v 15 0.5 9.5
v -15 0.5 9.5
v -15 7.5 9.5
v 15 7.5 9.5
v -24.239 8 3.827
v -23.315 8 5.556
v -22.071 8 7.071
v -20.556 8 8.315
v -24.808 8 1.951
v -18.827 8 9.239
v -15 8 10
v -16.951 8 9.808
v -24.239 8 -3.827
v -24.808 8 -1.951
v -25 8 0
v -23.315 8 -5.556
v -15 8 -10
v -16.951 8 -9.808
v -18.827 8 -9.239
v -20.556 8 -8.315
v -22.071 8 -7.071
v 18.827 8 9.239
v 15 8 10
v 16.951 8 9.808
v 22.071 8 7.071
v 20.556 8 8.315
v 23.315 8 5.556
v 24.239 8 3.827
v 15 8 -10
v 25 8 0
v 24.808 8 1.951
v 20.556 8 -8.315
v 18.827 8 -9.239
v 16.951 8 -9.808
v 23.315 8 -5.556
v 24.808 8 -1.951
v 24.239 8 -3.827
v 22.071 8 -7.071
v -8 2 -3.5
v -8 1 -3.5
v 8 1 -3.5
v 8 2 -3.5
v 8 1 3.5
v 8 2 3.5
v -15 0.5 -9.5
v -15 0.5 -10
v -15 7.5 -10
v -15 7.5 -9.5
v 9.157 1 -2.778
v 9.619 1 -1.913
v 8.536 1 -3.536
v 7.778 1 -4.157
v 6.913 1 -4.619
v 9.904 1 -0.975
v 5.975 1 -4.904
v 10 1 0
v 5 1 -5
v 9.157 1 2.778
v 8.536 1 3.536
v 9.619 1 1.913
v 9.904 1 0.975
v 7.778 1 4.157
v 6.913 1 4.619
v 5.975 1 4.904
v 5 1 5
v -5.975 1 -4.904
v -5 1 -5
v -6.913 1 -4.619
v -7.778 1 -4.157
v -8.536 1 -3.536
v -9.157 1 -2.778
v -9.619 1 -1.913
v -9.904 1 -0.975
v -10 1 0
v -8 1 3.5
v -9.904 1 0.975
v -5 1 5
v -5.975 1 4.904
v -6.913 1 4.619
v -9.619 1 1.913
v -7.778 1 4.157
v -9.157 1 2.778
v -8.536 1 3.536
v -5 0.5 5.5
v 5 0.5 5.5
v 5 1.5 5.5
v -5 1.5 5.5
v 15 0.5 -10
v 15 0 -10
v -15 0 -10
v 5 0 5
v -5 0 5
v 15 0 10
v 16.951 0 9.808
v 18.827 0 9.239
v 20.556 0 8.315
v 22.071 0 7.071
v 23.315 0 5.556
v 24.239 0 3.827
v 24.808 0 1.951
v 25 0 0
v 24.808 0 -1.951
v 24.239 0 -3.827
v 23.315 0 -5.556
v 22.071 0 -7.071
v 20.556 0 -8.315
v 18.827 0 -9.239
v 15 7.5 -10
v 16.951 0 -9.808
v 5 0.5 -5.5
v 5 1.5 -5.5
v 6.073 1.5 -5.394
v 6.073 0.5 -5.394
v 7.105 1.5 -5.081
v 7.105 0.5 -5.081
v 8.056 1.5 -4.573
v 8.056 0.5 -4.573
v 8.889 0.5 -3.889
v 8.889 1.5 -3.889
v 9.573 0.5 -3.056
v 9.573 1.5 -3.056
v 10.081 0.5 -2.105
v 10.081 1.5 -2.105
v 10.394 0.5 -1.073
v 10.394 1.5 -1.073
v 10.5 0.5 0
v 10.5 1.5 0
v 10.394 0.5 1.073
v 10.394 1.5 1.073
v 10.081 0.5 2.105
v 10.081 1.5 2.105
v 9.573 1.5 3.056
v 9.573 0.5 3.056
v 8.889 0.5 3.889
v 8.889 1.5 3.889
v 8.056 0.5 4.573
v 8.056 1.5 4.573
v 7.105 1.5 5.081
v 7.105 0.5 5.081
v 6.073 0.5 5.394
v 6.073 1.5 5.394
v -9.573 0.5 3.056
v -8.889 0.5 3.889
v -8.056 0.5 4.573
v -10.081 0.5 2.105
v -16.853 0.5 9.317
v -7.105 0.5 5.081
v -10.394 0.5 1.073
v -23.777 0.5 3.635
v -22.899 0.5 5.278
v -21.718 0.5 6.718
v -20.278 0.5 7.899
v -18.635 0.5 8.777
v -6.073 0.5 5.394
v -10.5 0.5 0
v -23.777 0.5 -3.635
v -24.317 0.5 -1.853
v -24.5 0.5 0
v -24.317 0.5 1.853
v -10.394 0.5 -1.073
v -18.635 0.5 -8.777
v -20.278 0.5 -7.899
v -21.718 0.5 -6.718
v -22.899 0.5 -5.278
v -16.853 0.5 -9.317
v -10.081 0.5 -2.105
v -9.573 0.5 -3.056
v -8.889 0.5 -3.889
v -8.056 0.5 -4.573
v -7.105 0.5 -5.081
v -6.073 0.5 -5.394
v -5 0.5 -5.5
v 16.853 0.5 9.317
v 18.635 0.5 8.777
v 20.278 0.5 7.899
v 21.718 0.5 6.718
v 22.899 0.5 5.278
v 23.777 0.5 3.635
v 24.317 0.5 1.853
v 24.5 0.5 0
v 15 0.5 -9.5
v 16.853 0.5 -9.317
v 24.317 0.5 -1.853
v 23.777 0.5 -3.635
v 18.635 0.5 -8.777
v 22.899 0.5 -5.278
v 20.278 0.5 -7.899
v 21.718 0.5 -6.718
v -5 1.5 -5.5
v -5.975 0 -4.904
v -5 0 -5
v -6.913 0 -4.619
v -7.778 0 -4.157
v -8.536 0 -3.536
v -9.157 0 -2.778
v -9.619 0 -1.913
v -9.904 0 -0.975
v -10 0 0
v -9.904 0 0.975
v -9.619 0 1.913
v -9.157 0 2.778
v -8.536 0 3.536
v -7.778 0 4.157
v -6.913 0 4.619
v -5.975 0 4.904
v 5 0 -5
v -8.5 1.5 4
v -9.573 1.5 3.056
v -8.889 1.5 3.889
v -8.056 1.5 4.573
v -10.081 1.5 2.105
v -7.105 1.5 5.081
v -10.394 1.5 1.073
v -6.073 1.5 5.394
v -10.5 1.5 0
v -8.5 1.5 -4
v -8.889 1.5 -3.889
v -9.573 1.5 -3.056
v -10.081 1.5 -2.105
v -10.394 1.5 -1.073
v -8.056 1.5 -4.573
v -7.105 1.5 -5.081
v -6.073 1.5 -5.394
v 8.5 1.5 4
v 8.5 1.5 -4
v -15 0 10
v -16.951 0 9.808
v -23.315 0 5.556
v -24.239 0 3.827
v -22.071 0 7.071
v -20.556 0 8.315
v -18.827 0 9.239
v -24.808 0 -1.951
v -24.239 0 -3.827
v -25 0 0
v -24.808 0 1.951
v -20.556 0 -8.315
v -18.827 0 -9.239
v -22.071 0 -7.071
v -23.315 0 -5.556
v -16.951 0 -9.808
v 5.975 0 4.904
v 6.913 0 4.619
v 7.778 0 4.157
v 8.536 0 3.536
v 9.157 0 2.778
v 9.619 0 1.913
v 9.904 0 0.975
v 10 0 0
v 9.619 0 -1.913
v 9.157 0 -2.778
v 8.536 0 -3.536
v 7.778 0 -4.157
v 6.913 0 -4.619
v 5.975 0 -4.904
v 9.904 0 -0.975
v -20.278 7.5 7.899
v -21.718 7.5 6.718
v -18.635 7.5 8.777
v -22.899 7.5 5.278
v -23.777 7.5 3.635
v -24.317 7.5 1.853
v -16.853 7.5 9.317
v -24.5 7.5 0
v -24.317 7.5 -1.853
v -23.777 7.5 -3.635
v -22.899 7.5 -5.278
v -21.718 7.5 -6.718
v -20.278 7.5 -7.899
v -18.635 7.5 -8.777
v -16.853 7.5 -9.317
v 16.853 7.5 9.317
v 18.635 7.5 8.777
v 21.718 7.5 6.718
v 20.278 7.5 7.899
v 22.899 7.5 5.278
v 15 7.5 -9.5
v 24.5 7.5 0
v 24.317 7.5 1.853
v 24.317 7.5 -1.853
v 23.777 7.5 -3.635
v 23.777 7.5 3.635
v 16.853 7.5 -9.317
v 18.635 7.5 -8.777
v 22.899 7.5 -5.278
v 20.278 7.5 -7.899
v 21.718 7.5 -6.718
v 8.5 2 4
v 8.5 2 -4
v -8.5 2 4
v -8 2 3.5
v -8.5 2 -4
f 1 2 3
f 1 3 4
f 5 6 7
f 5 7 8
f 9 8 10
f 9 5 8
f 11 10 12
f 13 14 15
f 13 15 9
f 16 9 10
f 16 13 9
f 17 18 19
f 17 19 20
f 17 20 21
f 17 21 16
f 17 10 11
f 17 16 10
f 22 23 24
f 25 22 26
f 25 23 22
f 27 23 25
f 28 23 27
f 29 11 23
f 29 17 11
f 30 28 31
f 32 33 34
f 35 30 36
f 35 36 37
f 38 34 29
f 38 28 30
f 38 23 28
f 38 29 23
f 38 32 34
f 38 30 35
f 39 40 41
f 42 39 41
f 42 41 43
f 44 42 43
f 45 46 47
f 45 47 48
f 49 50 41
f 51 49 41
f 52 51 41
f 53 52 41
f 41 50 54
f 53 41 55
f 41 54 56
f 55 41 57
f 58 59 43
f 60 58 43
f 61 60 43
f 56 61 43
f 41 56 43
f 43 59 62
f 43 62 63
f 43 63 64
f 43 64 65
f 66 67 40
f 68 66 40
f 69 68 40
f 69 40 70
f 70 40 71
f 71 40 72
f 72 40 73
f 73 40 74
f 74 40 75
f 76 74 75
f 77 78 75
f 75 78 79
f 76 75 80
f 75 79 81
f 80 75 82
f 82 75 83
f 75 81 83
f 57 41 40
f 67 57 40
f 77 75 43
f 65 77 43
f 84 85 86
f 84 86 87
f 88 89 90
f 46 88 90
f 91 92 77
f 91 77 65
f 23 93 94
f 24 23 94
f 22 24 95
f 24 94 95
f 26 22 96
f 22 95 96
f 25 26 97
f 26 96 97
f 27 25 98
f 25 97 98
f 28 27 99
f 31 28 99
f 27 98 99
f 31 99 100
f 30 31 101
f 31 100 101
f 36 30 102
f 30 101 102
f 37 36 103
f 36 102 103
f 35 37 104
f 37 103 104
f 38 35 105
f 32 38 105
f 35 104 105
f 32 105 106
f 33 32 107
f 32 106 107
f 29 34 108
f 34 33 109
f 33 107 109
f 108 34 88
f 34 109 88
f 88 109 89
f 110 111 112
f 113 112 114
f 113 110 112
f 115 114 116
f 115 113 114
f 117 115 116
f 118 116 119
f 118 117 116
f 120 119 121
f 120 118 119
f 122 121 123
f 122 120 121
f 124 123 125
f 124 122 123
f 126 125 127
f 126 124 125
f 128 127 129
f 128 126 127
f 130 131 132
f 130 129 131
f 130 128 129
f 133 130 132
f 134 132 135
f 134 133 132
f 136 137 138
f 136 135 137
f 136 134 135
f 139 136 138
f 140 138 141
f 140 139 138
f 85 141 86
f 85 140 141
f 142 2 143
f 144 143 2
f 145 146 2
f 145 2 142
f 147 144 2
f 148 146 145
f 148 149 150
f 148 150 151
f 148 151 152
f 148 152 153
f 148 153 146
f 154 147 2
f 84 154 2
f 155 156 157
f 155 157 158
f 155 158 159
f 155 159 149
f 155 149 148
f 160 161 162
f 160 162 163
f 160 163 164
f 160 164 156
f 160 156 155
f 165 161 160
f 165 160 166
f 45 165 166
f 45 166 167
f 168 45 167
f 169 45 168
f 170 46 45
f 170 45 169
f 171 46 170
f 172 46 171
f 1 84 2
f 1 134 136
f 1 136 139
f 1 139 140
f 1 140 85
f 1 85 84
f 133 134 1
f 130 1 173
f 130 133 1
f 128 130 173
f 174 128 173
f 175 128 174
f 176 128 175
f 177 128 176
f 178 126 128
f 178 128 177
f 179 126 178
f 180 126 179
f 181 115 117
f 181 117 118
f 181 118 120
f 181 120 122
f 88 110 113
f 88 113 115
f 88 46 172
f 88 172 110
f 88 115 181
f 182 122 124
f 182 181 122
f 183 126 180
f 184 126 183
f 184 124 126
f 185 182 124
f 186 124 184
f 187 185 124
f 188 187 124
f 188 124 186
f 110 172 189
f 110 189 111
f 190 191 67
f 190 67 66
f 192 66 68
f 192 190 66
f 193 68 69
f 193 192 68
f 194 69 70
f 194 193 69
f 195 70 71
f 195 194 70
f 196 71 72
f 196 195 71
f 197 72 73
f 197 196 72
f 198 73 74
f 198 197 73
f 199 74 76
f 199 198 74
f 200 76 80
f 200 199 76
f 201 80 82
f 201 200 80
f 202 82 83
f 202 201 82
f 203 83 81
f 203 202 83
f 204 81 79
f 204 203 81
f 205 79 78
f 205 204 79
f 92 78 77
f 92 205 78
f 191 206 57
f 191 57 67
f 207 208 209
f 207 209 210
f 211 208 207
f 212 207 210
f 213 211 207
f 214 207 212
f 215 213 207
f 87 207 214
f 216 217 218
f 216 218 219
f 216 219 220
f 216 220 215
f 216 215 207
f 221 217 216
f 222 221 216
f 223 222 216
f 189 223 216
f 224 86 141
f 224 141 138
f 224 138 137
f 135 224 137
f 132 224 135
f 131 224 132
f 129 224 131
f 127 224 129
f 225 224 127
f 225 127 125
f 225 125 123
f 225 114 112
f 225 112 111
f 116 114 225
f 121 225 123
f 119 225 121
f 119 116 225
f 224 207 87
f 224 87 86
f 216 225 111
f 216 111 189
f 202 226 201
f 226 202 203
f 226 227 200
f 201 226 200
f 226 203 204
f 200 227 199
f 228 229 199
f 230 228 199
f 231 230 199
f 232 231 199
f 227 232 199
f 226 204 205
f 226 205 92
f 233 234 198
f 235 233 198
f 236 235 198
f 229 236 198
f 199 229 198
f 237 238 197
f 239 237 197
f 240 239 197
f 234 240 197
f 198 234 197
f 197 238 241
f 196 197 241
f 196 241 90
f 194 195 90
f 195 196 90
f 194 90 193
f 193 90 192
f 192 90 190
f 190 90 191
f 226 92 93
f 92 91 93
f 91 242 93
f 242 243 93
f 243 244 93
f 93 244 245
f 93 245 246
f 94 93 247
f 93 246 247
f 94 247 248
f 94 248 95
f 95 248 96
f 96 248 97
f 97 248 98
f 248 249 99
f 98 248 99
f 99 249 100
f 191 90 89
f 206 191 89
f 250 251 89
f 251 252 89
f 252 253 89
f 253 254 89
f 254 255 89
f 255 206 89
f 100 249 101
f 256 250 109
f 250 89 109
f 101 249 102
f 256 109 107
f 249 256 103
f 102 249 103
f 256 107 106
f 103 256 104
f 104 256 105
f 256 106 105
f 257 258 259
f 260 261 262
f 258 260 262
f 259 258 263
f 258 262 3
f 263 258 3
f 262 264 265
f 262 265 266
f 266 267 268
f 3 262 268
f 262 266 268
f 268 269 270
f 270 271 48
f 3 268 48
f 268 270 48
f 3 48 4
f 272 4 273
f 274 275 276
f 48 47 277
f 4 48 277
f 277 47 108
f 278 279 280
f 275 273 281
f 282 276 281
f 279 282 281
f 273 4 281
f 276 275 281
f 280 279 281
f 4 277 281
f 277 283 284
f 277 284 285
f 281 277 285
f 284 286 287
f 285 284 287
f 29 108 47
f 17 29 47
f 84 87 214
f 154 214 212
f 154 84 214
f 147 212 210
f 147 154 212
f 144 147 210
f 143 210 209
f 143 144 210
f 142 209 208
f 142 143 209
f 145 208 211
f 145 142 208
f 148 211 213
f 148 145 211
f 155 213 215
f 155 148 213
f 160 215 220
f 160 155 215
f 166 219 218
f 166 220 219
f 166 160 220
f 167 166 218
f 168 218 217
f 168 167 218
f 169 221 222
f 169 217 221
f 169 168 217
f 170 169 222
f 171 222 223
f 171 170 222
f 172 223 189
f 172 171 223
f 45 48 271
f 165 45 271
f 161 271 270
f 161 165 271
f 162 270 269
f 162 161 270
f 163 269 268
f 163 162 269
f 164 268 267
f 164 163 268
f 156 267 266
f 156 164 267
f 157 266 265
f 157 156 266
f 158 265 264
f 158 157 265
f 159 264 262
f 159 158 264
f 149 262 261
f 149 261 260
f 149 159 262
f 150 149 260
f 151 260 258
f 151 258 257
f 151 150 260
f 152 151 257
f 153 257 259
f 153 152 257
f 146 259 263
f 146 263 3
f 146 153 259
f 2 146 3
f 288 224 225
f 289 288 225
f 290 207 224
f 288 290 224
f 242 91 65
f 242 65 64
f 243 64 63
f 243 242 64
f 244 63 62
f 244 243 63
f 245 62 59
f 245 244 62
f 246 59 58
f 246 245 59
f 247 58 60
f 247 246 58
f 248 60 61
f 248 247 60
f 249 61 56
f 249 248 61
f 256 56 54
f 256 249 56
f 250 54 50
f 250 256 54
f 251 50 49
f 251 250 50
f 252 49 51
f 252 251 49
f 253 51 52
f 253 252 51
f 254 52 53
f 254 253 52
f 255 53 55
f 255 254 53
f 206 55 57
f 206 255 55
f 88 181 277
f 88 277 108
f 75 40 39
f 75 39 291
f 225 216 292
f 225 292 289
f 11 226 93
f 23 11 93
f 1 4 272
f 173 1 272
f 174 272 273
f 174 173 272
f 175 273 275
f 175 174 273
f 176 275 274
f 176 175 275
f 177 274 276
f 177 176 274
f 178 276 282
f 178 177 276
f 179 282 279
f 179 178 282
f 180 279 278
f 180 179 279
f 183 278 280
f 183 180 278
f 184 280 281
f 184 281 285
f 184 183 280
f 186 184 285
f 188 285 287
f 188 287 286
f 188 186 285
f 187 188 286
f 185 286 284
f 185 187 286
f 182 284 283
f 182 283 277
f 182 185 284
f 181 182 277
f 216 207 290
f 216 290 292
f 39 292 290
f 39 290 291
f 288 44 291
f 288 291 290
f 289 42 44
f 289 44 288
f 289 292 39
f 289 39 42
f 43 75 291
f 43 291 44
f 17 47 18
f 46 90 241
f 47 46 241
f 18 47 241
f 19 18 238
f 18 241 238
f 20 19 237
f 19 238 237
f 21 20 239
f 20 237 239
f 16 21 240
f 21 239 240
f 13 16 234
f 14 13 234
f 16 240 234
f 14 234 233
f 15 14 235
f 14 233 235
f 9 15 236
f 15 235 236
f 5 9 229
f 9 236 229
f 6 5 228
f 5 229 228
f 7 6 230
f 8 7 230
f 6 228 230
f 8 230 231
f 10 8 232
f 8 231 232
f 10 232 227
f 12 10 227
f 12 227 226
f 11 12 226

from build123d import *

# Parameters (mm, degrees)
BOSS_EXTRUDE1_DEPTH = 8
CUT_EXTRUDE1_DEPTH  = 1
SKETCH4_W           = 16
SKETCH4_H           = 7
CUT_EXTRUDE2_DEPTH  = 1
SHELL3_START        = 2
SHELL3_DEPTH        = 5.5
SHELL3_START_2      = 0.5
SHELL3_2_DEPTH      = 1.5
SHELL3_START_3      = 1.5
SHELL3_3_OUTLINE_W  = 17
SHELL3_3_OUTLINE_H  = 8
SHELL3_3_DEPTH      = 0.5


# Read off the part's stored shape, not the designer's step: Shell3
with BuildPart() as part:
    # Sketch2 → Boss-Extrude1 (new body)
    with BuildSketch(Plane(origin=(0, 0, 0), x_dir=(1, 0, 0), z_dir=(0, 1, 0))):
        with BuildLine():
            Line((-15, -10), (15, -10))
            ThreePointArc((15, -10), (25, 0), (15, 10))
            Line((15, 10), (-15, 10))
            ThreePointArc((-15, 10), (-25, 0), (-15, -10))
        make_face()
    extrude(amount=BOSS_EXTRUDE1_DEPTH)

    # Sketch3 → Cut-Extrude1 (cut)
    with BuildSketch(Plane.XZ):
        with BuildLine():
            Line((-5, 5), (5, 5))
            ThreePointArc((5, 5), (10, 0), (5, -5))
            Line((5, -5), (-5, -5))
            ThreePointArc((-5, -5), (-10, 0), (-5, 5))
        make_face()
    extrude(amount=-CUT_EXTRUDE1_DEPTH, mode=Mode.SUBTRACT)

    # Sketch4 → Cut-Extrude2 (cut)
    with BuildSketch(Plane.XZ.offset(-1)):
        Rectangle(SKETCH4_W, SKETCH4_H)
    extrude(amount=-CUT_EXTRUDE2_DEPTH, mode=Mode.SUBTRACT)

    # Shell3 outline → Shell3 (cut)
    with BuildSketch(Plane(origin=(0, 0, 0), x_dir=(1, 0, 0), z_dir=(0, 1, 0)).offset(SHELL3_START)):
        with BuildLine():
            Line((15, 9.5), (15, 10))
            Line((15, 10), (-15, 10))
            Line((-15, 10), (-15, 9.5))
            ThreePointArc((-15, 9.5), (-24.5, 0), (-15, -9.5))
            Line((-15, -9.5), (15, -9.5))
            ThreePointArc((15, -9.5), (24.5, 0), (15, 9.5))
        make_face()
    extrude(amount=SHELL3_DEPTH, mode=Mode.SUBTRACT)

    # Shell3 2 outline → Shell3 2 (cut)
    with BuildSketch(Plane(origin=(0, 0, 0), x_dir=(1, 0, 0), z_dir=(0, 1, 0)).offset(SHELL3_START_2)):
        with BuildLine():
            Line((15, 9.5), (15, 10))
            Line((15, 10), (-15, 10))
            Line((-15, 10), (-15, 9.5))
            ThreePointArc((-15, 9.5), (-24.5, 0), (-15, -9.5))
            Line((-15, -9.5), (15, -9.5))
            ThreePointArc((15, -9.5), (24.5, 0), (15, 9.5))
        make_face()
        with BuildLine():
            Line((5, -5.5), (-5, -5.5))
            ThreePointArc((-5, -5.5), (-10.5, 0), (-5, 5.5))
            Line((-5, 5.5), (5, 5.5))
            ThreePointArc((5, 5.5), (10.5, 0), (5, -5.5))
        make_face(mode=Mode.SUBTRACT)
    extrude(amount=SHELL3_2_DEPTH, mode=Mode.SUBTRACT)

    # Shell3 3 outline → Shell3 3 (cut)
    with BuildSketch(Plane(origin=(0, 0, 0), x_dir=(1, 0, 0), z_dir=(0, 1, 0)).offset(SHELL3_START_3)):
        with BuildLine():
            ThreePointArc((-5, 5.5), (-10.5, 0), (-5, -5.5))
            Line((-5, -5.5), (5, -5.5))
            ThreePointArc((5, -5.5), (10.5, 0), (5, 5.5))
            Line((5, 5.5), (-5, 5.5))
        make_face()
        Rectangle(SHELL3_3_OUTLINE_W, SHELL3_3_OUTLINE_H, mode=Mode.SUBTRACT)
    extrude(amount=SHELL3_3_DEPTH, mode=Mode.SUBTRACT)


solid = part.part
